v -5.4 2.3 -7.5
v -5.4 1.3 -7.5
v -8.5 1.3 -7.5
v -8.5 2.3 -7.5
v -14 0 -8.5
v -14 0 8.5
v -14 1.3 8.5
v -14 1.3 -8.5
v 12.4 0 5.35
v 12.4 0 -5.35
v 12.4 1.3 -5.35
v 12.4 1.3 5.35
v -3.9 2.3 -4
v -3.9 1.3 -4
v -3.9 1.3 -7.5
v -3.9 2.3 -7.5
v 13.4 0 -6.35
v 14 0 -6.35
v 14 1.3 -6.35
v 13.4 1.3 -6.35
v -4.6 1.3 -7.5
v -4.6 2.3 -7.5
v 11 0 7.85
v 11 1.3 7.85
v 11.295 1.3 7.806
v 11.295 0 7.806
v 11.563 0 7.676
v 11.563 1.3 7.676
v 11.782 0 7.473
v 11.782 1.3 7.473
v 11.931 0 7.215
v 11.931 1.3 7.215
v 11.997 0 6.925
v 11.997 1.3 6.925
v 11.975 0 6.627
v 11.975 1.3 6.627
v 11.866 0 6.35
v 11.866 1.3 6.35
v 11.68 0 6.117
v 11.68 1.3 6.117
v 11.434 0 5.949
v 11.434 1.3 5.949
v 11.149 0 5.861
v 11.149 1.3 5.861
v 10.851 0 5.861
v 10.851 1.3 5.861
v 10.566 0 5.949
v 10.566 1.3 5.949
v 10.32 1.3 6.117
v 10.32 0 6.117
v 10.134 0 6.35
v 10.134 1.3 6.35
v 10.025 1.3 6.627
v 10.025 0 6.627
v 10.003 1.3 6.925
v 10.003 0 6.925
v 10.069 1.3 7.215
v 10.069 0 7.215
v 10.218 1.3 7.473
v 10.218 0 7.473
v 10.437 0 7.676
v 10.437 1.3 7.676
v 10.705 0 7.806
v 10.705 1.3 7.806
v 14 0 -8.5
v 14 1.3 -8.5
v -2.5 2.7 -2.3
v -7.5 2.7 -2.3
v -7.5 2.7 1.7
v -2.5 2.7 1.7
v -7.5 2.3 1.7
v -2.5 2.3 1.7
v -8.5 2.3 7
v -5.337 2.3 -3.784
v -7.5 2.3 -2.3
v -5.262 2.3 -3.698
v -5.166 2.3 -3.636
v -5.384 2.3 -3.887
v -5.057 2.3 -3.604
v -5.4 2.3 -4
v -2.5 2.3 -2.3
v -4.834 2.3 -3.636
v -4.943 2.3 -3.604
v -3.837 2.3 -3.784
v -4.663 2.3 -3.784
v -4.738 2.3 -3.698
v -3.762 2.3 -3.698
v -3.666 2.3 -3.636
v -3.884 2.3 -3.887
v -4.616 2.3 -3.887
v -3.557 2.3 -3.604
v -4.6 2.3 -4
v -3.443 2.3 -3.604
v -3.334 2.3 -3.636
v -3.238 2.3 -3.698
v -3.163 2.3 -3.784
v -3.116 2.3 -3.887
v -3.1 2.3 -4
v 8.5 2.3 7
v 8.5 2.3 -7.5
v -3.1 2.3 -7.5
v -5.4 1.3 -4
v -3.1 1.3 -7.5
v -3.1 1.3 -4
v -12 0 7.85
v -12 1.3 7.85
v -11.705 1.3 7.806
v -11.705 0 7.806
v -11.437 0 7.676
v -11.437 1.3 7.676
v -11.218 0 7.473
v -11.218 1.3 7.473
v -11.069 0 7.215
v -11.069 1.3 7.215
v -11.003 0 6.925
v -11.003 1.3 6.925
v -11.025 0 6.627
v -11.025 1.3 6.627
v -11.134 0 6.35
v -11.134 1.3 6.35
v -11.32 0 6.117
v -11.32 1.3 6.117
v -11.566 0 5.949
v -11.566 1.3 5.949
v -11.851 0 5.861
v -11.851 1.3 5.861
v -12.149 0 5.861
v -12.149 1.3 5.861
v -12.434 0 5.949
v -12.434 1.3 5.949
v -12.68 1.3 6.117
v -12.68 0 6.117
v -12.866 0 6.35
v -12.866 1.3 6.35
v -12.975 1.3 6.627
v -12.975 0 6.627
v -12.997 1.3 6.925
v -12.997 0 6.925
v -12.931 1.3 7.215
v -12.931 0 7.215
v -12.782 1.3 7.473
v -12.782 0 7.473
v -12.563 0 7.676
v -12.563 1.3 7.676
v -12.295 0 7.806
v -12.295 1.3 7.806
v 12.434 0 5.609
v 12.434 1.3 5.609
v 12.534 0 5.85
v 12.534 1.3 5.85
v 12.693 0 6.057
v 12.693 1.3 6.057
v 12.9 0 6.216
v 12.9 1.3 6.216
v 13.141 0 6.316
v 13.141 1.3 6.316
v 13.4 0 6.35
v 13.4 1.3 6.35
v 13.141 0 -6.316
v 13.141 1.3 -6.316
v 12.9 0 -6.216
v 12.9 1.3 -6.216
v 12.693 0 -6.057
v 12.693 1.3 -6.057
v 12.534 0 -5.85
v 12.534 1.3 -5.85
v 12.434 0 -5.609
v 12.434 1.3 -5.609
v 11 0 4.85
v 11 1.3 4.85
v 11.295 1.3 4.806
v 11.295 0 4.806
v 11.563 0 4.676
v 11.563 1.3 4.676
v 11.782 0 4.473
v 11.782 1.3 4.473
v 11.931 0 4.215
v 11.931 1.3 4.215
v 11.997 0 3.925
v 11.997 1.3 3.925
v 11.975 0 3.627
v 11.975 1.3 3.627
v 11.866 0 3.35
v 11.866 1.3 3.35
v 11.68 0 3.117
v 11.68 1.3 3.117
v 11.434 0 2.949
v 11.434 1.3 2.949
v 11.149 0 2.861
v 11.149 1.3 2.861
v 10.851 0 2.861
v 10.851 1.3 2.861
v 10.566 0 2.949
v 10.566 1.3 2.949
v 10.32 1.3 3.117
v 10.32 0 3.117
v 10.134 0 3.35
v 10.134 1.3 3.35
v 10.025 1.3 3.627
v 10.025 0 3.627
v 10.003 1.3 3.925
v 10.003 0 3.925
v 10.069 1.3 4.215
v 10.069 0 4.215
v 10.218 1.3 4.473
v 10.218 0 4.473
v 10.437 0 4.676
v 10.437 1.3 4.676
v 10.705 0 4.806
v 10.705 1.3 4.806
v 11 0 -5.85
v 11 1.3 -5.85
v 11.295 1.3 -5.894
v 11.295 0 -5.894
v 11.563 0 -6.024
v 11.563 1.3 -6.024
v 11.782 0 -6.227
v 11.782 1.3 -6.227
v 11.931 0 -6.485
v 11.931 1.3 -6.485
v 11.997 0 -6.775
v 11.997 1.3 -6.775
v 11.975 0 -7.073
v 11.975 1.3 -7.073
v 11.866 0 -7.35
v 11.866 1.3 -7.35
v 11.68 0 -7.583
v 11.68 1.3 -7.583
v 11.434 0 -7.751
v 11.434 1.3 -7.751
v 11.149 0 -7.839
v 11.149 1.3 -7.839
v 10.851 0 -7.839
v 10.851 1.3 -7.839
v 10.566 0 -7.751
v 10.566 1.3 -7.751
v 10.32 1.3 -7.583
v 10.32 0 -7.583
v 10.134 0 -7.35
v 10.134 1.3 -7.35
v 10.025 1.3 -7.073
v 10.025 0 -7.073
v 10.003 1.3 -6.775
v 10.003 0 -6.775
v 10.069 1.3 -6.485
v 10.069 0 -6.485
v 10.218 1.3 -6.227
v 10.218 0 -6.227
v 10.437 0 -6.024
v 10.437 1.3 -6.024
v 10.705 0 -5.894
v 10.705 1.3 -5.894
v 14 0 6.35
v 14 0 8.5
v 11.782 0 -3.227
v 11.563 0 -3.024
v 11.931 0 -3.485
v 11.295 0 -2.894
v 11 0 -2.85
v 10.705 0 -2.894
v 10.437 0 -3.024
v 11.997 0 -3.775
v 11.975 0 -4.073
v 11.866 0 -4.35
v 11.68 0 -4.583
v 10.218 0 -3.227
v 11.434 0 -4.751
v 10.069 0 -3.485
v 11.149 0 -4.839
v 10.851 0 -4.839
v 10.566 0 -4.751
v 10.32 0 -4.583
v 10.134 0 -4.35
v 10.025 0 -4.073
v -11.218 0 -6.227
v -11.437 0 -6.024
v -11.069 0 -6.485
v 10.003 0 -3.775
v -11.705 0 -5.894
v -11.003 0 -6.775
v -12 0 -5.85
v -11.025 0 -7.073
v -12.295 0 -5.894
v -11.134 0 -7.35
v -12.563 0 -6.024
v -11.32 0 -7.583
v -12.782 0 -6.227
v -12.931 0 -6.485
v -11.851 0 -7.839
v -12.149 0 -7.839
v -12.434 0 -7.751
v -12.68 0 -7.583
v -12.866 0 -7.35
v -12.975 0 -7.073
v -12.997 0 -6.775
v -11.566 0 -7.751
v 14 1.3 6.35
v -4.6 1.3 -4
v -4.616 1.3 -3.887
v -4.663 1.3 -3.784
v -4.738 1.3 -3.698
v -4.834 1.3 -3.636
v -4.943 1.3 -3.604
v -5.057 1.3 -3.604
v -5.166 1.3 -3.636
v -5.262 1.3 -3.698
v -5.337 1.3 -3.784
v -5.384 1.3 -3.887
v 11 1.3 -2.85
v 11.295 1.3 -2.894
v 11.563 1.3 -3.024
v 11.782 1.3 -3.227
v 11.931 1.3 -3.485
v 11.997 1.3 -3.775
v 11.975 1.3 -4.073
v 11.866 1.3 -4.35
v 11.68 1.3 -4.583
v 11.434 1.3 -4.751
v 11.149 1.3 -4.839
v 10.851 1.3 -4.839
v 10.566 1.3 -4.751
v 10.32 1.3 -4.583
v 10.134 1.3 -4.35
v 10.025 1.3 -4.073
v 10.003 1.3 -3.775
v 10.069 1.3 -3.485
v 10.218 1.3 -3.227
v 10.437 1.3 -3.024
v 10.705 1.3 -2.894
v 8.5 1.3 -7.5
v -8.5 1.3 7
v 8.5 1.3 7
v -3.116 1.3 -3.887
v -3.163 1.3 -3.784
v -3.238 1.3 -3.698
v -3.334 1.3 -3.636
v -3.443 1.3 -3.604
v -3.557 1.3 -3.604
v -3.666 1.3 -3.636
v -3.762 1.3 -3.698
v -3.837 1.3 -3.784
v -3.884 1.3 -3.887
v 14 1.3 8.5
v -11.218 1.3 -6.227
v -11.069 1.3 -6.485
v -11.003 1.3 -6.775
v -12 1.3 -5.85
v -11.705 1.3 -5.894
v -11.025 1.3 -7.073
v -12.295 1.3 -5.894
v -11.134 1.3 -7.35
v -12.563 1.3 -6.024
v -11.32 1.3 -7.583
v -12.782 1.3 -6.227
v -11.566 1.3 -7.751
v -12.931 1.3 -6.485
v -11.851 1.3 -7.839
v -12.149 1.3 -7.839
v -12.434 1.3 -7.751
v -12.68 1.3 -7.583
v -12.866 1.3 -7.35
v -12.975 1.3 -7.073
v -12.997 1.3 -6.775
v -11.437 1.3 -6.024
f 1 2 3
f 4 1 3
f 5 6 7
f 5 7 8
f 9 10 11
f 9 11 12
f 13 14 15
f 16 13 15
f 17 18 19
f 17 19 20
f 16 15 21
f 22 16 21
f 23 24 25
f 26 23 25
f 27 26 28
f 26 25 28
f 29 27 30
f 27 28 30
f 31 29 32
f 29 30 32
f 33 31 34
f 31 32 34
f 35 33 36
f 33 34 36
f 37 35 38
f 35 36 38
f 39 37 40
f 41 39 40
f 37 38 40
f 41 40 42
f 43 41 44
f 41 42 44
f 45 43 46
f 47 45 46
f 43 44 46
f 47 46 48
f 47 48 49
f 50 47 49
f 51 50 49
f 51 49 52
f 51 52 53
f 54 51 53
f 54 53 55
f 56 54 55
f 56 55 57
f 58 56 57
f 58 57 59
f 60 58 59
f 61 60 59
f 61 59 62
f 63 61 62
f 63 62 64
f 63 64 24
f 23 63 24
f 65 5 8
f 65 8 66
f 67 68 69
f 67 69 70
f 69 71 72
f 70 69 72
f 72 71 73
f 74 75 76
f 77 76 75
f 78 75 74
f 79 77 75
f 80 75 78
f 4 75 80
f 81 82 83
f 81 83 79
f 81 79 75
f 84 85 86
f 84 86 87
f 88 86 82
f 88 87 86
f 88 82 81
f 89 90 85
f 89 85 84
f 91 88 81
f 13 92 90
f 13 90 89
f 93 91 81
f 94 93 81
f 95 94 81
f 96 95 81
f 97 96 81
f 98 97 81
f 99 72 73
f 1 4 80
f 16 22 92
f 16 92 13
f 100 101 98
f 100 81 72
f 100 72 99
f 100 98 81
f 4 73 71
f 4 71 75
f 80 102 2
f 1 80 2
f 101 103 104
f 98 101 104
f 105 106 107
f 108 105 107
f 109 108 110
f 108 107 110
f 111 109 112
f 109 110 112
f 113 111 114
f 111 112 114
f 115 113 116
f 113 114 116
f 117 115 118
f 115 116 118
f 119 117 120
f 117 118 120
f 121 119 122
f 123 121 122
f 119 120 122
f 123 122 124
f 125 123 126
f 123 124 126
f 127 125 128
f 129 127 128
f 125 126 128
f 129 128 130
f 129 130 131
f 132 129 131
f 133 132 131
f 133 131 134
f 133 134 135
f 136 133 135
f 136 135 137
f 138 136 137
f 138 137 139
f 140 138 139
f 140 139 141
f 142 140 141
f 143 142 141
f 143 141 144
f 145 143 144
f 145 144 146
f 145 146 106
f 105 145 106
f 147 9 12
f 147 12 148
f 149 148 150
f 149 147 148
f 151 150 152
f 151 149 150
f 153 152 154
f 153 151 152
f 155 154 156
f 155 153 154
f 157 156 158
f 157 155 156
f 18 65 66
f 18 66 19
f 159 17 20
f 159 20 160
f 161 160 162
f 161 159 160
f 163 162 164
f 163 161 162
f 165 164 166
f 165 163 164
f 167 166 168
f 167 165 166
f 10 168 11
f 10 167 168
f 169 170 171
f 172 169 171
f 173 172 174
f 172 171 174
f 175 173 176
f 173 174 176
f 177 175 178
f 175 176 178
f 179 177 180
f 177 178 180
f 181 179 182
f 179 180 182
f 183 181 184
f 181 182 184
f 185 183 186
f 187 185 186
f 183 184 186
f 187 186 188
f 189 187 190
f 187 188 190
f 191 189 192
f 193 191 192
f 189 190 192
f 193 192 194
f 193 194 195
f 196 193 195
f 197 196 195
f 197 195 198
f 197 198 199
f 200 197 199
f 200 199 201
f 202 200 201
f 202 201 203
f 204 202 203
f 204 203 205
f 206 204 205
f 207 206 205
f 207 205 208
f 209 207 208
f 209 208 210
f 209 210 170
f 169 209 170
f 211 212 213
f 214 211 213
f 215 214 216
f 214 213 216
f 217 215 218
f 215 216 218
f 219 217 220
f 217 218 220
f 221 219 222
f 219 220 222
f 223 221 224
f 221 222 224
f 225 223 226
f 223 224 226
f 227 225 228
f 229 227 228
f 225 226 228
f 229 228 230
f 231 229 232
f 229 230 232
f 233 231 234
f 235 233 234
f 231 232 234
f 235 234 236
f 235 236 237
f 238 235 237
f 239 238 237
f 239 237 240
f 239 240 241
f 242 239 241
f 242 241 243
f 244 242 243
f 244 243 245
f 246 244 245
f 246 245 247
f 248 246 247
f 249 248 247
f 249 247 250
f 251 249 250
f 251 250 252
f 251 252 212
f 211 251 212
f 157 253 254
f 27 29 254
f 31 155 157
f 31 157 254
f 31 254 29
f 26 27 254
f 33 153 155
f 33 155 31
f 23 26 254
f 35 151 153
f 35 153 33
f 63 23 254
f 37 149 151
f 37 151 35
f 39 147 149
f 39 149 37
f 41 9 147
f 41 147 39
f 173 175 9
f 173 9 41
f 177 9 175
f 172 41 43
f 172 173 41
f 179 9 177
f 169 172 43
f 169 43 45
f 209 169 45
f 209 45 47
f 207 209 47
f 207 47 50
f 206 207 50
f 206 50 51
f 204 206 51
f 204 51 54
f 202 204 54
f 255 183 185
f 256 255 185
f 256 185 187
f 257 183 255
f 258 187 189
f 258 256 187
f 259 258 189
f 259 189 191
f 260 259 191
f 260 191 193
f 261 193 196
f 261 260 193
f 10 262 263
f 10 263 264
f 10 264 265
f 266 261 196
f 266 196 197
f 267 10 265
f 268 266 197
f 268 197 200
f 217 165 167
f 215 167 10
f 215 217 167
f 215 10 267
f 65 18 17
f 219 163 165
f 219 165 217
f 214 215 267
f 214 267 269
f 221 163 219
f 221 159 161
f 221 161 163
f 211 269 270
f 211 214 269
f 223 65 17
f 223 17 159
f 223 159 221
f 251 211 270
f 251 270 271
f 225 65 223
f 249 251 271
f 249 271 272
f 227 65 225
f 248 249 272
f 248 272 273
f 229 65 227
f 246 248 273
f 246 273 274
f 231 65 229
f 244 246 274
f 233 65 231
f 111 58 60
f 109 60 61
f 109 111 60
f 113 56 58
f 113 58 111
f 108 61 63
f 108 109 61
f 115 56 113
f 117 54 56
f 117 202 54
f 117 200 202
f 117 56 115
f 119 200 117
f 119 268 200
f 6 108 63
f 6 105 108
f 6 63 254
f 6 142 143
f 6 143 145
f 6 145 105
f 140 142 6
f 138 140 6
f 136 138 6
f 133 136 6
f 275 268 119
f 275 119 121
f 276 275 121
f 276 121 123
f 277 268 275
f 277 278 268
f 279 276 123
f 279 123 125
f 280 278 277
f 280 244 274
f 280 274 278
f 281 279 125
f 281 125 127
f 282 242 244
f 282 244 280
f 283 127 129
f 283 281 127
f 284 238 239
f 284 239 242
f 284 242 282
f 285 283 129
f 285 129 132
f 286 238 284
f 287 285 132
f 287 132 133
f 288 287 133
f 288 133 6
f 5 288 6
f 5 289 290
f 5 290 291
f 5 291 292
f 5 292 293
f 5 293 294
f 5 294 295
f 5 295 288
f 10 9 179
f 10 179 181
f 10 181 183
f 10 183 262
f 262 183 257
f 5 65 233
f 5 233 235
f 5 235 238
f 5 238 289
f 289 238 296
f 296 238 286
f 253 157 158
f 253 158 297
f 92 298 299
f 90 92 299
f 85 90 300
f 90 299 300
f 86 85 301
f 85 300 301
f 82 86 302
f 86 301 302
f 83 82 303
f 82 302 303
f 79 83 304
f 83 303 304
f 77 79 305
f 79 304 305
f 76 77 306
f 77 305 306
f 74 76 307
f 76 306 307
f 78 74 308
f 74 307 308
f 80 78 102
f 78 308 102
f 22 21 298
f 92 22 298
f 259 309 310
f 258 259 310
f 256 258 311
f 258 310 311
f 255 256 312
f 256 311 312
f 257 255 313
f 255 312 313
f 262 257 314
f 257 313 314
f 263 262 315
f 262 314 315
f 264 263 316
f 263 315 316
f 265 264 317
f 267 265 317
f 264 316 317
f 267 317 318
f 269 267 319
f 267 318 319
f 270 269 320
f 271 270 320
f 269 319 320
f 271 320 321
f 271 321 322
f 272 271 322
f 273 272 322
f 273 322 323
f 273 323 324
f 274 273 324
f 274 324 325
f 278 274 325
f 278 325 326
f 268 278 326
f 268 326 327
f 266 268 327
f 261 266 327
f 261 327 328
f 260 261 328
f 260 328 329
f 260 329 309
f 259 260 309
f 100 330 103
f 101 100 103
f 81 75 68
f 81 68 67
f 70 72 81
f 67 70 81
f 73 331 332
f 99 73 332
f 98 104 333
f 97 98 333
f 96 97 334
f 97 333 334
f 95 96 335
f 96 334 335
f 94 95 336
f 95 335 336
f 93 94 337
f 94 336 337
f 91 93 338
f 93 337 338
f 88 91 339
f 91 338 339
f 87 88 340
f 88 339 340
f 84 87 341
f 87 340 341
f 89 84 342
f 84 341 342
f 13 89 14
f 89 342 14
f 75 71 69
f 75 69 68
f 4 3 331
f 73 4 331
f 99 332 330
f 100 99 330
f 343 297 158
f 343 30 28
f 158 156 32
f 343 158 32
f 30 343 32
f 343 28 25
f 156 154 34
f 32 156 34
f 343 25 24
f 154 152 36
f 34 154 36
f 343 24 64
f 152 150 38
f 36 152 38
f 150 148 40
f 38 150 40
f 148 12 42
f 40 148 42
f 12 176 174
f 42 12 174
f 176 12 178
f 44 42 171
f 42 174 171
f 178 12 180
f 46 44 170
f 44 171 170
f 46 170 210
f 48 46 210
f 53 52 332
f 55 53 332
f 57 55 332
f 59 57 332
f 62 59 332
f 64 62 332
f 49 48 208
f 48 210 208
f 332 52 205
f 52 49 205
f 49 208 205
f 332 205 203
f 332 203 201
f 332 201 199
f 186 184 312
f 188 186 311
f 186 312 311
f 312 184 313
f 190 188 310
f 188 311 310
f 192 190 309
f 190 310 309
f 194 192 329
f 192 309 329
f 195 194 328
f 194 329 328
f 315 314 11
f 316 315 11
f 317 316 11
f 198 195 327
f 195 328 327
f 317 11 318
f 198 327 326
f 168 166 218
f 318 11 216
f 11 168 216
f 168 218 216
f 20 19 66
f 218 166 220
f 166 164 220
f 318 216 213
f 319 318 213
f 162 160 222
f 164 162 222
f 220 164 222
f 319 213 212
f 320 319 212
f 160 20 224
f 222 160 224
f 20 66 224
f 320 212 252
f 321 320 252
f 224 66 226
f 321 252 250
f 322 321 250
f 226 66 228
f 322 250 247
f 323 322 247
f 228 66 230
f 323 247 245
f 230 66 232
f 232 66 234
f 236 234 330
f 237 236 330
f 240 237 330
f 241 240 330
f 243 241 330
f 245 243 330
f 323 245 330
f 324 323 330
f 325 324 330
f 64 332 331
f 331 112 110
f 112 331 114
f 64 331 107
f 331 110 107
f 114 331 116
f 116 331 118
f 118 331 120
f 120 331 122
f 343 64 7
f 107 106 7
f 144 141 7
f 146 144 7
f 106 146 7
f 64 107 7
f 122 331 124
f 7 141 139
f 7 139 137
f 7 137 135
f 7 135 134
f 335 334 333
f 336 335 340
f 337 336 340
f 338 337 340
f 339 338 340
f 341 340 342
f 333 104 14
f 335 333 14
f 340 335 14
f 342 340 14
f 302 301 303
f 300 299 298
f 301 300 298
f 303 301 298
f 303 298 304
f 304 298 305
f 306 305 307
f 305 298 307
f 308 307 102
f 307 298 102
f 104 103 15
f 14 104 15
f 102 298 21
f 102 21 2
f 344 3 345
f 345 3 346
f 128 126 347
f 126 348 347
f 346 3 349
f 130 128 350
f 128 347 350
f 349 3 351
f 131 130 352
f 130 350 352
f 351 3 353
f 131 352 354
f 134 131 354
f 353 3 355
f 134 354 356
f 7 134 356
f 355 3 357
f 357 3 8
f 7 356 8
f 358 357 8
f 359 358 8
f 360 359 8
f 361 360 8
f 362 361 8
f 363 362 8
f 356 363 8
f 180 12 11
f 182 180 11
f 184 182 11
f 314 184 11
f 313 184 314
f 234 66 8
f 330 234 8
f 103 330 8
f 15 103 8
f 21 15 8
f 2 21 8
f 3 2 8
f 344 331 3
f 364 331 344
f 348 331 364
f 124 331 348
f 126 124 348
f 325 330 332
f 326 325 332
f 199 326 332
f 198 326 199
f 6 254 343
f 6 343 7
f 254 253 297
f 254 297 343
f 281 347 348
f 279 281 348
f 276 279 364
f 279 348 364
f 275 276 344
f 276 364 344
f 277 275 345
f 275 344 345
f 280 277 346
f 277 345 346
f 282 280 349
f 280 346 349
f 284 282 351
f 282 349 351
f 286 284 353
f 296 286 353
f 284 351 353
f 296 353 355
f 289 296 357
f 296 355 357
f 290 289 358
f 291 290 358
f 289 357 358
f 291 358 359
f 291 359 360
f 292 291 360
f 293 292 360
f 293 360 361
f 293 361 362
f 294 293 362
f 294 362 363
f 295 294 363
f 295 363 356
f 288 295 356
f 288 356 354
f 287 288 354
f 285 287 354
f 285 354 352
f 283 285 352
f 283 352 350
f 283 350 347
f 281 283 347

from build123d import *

# Parameters (mm, degrees)
EXTRUDE_1_DEPTH     = 1.3
SKETCH_2_R          = 1
CUT_EXTRUDE_1_DEPTH = 17.429850882
EXTRUDE_2_DEPTH     = 1
SKETCH_4_W          = 5
SKETCH_4_H          = 4
EXTRUDE_3_DEPTH     = 0.4


with BuildPart() as part:
    # Эскиз1 → Бобышка-Вытянуть1 (new body)
    with BuildSketch(Plane(origin=(0, 0, 0), x_dir=(1, 0, 0), z_dir=(0, 1, 0))):
        with BuildLine():
            Line((12.4, 5.35), (12.4, -5.35))
            ThreePointArc((12.4, -5.35), (12.692893219, -6.057106781), (13.4, -6.35))
            Line((13.4, -6.35), (14, -6.35))
            Line((14, -6.35), (14, -8.5))
            Line((14, -8.5), (-14, -8.5))
            Line((-14, -8.5), (-14, 8.5))
            Line((-14, 8.5), (14, 8.5))
            Line((14, 8.5), (14, 6.35))
            Line((14, 6.35), (13.4, 6.35))
            ThreePointArc((13.4, 6.35), (12.692893219, 6.057106781), (12.4, 5.35))
        make_face()
    extrude(amount=EXTRUDE_1_DEPTH)

    # Эскиз2 → Вырез-Вытянуть1 (cut, through all)
    with BuildSketch(Plane(origin=(0, 1.3, 0), x_dir=(1, 0, 0), z_dir=(0, 1, 0))):
        with Locations(Location((11, 6.85, 0), (0, 0, 270))):
            Circle(SKETCH_2_R)
        with Locations(Location((-12, 6.85, 0), (0, 0, 270))):
            Circle(SKETCH_2_R)
        with Locations(Location((-12, -6.85, 0), (0, 0, 270))):
            Circle(SKETCH_2_R)
        with Locations(Location((11, -6.85, 0), (0, 0, 270))):
            Circle(SKETCH_2_R)
        with Locations(Location((11, -3.85, 0), (0, 0, 270))):
            Circle(SKETCH_2_R)
        with Locations(Location((11, 3.85, 0), (0, 0, 270))):
            Circle(SKETCH_2_R)
    extrude(amount=-CUT_EXTRUDE_1_DEPTH, mode=Mode.SUBTRACT)

    # Эскиз3 → Бобышка-Вытянуть2 (add)
    with BuildSketch(Plane(origin=(0, 1.3, 0), x_dir=(1, 0, 0), z_dir=(0, 1, 0))):
        with BuildLine():
            Line((-5.4, 4), (-5.4, 7.5))
            Line((-5.4, 7.5), (-8.5, 7.5))
            Line((-8.5, 7.5), (-8.5, -7))
            Line((-8.5, -7), (8.5, -7))
            Line((8.5, -7), (8.5, 7.5))
            Line((8.5, 7.5), (-3.1, 7.5))
            Line((-3.1, 7.5), (-3.1, 4))
            ThreePointArc((-3.1, 4), (-3.5, 3.6), (-3.9, 4))
            Line((-3.9, 4), (-3.9, 7.5))
            Line((-3.9, 7.5), (-4.6, 7.5))
            Line((-4.6, 7.5), (-4.6, 4))
            ThreePointArc((-4.6, 4), (-5, 3.6), (-5.4, 4))
        make_face()
    extrude(amount=EXTRUDE_2_DEPTH)

    # Эскиз4 → Бобышка-Вытянуть3 (add)
    with BuildSketch(Plane(origin=(0, 2.3, 0), x_dir=(1, 0, 0), z_dir=(0, 1, 0))):
        with Locations((-5, 0.3)):
            Rectangle(SKETCH_4_W, SKETCH_4_H)
    extrude(amount=EXTRUDE_3_DEPTH)


solid = part.part
